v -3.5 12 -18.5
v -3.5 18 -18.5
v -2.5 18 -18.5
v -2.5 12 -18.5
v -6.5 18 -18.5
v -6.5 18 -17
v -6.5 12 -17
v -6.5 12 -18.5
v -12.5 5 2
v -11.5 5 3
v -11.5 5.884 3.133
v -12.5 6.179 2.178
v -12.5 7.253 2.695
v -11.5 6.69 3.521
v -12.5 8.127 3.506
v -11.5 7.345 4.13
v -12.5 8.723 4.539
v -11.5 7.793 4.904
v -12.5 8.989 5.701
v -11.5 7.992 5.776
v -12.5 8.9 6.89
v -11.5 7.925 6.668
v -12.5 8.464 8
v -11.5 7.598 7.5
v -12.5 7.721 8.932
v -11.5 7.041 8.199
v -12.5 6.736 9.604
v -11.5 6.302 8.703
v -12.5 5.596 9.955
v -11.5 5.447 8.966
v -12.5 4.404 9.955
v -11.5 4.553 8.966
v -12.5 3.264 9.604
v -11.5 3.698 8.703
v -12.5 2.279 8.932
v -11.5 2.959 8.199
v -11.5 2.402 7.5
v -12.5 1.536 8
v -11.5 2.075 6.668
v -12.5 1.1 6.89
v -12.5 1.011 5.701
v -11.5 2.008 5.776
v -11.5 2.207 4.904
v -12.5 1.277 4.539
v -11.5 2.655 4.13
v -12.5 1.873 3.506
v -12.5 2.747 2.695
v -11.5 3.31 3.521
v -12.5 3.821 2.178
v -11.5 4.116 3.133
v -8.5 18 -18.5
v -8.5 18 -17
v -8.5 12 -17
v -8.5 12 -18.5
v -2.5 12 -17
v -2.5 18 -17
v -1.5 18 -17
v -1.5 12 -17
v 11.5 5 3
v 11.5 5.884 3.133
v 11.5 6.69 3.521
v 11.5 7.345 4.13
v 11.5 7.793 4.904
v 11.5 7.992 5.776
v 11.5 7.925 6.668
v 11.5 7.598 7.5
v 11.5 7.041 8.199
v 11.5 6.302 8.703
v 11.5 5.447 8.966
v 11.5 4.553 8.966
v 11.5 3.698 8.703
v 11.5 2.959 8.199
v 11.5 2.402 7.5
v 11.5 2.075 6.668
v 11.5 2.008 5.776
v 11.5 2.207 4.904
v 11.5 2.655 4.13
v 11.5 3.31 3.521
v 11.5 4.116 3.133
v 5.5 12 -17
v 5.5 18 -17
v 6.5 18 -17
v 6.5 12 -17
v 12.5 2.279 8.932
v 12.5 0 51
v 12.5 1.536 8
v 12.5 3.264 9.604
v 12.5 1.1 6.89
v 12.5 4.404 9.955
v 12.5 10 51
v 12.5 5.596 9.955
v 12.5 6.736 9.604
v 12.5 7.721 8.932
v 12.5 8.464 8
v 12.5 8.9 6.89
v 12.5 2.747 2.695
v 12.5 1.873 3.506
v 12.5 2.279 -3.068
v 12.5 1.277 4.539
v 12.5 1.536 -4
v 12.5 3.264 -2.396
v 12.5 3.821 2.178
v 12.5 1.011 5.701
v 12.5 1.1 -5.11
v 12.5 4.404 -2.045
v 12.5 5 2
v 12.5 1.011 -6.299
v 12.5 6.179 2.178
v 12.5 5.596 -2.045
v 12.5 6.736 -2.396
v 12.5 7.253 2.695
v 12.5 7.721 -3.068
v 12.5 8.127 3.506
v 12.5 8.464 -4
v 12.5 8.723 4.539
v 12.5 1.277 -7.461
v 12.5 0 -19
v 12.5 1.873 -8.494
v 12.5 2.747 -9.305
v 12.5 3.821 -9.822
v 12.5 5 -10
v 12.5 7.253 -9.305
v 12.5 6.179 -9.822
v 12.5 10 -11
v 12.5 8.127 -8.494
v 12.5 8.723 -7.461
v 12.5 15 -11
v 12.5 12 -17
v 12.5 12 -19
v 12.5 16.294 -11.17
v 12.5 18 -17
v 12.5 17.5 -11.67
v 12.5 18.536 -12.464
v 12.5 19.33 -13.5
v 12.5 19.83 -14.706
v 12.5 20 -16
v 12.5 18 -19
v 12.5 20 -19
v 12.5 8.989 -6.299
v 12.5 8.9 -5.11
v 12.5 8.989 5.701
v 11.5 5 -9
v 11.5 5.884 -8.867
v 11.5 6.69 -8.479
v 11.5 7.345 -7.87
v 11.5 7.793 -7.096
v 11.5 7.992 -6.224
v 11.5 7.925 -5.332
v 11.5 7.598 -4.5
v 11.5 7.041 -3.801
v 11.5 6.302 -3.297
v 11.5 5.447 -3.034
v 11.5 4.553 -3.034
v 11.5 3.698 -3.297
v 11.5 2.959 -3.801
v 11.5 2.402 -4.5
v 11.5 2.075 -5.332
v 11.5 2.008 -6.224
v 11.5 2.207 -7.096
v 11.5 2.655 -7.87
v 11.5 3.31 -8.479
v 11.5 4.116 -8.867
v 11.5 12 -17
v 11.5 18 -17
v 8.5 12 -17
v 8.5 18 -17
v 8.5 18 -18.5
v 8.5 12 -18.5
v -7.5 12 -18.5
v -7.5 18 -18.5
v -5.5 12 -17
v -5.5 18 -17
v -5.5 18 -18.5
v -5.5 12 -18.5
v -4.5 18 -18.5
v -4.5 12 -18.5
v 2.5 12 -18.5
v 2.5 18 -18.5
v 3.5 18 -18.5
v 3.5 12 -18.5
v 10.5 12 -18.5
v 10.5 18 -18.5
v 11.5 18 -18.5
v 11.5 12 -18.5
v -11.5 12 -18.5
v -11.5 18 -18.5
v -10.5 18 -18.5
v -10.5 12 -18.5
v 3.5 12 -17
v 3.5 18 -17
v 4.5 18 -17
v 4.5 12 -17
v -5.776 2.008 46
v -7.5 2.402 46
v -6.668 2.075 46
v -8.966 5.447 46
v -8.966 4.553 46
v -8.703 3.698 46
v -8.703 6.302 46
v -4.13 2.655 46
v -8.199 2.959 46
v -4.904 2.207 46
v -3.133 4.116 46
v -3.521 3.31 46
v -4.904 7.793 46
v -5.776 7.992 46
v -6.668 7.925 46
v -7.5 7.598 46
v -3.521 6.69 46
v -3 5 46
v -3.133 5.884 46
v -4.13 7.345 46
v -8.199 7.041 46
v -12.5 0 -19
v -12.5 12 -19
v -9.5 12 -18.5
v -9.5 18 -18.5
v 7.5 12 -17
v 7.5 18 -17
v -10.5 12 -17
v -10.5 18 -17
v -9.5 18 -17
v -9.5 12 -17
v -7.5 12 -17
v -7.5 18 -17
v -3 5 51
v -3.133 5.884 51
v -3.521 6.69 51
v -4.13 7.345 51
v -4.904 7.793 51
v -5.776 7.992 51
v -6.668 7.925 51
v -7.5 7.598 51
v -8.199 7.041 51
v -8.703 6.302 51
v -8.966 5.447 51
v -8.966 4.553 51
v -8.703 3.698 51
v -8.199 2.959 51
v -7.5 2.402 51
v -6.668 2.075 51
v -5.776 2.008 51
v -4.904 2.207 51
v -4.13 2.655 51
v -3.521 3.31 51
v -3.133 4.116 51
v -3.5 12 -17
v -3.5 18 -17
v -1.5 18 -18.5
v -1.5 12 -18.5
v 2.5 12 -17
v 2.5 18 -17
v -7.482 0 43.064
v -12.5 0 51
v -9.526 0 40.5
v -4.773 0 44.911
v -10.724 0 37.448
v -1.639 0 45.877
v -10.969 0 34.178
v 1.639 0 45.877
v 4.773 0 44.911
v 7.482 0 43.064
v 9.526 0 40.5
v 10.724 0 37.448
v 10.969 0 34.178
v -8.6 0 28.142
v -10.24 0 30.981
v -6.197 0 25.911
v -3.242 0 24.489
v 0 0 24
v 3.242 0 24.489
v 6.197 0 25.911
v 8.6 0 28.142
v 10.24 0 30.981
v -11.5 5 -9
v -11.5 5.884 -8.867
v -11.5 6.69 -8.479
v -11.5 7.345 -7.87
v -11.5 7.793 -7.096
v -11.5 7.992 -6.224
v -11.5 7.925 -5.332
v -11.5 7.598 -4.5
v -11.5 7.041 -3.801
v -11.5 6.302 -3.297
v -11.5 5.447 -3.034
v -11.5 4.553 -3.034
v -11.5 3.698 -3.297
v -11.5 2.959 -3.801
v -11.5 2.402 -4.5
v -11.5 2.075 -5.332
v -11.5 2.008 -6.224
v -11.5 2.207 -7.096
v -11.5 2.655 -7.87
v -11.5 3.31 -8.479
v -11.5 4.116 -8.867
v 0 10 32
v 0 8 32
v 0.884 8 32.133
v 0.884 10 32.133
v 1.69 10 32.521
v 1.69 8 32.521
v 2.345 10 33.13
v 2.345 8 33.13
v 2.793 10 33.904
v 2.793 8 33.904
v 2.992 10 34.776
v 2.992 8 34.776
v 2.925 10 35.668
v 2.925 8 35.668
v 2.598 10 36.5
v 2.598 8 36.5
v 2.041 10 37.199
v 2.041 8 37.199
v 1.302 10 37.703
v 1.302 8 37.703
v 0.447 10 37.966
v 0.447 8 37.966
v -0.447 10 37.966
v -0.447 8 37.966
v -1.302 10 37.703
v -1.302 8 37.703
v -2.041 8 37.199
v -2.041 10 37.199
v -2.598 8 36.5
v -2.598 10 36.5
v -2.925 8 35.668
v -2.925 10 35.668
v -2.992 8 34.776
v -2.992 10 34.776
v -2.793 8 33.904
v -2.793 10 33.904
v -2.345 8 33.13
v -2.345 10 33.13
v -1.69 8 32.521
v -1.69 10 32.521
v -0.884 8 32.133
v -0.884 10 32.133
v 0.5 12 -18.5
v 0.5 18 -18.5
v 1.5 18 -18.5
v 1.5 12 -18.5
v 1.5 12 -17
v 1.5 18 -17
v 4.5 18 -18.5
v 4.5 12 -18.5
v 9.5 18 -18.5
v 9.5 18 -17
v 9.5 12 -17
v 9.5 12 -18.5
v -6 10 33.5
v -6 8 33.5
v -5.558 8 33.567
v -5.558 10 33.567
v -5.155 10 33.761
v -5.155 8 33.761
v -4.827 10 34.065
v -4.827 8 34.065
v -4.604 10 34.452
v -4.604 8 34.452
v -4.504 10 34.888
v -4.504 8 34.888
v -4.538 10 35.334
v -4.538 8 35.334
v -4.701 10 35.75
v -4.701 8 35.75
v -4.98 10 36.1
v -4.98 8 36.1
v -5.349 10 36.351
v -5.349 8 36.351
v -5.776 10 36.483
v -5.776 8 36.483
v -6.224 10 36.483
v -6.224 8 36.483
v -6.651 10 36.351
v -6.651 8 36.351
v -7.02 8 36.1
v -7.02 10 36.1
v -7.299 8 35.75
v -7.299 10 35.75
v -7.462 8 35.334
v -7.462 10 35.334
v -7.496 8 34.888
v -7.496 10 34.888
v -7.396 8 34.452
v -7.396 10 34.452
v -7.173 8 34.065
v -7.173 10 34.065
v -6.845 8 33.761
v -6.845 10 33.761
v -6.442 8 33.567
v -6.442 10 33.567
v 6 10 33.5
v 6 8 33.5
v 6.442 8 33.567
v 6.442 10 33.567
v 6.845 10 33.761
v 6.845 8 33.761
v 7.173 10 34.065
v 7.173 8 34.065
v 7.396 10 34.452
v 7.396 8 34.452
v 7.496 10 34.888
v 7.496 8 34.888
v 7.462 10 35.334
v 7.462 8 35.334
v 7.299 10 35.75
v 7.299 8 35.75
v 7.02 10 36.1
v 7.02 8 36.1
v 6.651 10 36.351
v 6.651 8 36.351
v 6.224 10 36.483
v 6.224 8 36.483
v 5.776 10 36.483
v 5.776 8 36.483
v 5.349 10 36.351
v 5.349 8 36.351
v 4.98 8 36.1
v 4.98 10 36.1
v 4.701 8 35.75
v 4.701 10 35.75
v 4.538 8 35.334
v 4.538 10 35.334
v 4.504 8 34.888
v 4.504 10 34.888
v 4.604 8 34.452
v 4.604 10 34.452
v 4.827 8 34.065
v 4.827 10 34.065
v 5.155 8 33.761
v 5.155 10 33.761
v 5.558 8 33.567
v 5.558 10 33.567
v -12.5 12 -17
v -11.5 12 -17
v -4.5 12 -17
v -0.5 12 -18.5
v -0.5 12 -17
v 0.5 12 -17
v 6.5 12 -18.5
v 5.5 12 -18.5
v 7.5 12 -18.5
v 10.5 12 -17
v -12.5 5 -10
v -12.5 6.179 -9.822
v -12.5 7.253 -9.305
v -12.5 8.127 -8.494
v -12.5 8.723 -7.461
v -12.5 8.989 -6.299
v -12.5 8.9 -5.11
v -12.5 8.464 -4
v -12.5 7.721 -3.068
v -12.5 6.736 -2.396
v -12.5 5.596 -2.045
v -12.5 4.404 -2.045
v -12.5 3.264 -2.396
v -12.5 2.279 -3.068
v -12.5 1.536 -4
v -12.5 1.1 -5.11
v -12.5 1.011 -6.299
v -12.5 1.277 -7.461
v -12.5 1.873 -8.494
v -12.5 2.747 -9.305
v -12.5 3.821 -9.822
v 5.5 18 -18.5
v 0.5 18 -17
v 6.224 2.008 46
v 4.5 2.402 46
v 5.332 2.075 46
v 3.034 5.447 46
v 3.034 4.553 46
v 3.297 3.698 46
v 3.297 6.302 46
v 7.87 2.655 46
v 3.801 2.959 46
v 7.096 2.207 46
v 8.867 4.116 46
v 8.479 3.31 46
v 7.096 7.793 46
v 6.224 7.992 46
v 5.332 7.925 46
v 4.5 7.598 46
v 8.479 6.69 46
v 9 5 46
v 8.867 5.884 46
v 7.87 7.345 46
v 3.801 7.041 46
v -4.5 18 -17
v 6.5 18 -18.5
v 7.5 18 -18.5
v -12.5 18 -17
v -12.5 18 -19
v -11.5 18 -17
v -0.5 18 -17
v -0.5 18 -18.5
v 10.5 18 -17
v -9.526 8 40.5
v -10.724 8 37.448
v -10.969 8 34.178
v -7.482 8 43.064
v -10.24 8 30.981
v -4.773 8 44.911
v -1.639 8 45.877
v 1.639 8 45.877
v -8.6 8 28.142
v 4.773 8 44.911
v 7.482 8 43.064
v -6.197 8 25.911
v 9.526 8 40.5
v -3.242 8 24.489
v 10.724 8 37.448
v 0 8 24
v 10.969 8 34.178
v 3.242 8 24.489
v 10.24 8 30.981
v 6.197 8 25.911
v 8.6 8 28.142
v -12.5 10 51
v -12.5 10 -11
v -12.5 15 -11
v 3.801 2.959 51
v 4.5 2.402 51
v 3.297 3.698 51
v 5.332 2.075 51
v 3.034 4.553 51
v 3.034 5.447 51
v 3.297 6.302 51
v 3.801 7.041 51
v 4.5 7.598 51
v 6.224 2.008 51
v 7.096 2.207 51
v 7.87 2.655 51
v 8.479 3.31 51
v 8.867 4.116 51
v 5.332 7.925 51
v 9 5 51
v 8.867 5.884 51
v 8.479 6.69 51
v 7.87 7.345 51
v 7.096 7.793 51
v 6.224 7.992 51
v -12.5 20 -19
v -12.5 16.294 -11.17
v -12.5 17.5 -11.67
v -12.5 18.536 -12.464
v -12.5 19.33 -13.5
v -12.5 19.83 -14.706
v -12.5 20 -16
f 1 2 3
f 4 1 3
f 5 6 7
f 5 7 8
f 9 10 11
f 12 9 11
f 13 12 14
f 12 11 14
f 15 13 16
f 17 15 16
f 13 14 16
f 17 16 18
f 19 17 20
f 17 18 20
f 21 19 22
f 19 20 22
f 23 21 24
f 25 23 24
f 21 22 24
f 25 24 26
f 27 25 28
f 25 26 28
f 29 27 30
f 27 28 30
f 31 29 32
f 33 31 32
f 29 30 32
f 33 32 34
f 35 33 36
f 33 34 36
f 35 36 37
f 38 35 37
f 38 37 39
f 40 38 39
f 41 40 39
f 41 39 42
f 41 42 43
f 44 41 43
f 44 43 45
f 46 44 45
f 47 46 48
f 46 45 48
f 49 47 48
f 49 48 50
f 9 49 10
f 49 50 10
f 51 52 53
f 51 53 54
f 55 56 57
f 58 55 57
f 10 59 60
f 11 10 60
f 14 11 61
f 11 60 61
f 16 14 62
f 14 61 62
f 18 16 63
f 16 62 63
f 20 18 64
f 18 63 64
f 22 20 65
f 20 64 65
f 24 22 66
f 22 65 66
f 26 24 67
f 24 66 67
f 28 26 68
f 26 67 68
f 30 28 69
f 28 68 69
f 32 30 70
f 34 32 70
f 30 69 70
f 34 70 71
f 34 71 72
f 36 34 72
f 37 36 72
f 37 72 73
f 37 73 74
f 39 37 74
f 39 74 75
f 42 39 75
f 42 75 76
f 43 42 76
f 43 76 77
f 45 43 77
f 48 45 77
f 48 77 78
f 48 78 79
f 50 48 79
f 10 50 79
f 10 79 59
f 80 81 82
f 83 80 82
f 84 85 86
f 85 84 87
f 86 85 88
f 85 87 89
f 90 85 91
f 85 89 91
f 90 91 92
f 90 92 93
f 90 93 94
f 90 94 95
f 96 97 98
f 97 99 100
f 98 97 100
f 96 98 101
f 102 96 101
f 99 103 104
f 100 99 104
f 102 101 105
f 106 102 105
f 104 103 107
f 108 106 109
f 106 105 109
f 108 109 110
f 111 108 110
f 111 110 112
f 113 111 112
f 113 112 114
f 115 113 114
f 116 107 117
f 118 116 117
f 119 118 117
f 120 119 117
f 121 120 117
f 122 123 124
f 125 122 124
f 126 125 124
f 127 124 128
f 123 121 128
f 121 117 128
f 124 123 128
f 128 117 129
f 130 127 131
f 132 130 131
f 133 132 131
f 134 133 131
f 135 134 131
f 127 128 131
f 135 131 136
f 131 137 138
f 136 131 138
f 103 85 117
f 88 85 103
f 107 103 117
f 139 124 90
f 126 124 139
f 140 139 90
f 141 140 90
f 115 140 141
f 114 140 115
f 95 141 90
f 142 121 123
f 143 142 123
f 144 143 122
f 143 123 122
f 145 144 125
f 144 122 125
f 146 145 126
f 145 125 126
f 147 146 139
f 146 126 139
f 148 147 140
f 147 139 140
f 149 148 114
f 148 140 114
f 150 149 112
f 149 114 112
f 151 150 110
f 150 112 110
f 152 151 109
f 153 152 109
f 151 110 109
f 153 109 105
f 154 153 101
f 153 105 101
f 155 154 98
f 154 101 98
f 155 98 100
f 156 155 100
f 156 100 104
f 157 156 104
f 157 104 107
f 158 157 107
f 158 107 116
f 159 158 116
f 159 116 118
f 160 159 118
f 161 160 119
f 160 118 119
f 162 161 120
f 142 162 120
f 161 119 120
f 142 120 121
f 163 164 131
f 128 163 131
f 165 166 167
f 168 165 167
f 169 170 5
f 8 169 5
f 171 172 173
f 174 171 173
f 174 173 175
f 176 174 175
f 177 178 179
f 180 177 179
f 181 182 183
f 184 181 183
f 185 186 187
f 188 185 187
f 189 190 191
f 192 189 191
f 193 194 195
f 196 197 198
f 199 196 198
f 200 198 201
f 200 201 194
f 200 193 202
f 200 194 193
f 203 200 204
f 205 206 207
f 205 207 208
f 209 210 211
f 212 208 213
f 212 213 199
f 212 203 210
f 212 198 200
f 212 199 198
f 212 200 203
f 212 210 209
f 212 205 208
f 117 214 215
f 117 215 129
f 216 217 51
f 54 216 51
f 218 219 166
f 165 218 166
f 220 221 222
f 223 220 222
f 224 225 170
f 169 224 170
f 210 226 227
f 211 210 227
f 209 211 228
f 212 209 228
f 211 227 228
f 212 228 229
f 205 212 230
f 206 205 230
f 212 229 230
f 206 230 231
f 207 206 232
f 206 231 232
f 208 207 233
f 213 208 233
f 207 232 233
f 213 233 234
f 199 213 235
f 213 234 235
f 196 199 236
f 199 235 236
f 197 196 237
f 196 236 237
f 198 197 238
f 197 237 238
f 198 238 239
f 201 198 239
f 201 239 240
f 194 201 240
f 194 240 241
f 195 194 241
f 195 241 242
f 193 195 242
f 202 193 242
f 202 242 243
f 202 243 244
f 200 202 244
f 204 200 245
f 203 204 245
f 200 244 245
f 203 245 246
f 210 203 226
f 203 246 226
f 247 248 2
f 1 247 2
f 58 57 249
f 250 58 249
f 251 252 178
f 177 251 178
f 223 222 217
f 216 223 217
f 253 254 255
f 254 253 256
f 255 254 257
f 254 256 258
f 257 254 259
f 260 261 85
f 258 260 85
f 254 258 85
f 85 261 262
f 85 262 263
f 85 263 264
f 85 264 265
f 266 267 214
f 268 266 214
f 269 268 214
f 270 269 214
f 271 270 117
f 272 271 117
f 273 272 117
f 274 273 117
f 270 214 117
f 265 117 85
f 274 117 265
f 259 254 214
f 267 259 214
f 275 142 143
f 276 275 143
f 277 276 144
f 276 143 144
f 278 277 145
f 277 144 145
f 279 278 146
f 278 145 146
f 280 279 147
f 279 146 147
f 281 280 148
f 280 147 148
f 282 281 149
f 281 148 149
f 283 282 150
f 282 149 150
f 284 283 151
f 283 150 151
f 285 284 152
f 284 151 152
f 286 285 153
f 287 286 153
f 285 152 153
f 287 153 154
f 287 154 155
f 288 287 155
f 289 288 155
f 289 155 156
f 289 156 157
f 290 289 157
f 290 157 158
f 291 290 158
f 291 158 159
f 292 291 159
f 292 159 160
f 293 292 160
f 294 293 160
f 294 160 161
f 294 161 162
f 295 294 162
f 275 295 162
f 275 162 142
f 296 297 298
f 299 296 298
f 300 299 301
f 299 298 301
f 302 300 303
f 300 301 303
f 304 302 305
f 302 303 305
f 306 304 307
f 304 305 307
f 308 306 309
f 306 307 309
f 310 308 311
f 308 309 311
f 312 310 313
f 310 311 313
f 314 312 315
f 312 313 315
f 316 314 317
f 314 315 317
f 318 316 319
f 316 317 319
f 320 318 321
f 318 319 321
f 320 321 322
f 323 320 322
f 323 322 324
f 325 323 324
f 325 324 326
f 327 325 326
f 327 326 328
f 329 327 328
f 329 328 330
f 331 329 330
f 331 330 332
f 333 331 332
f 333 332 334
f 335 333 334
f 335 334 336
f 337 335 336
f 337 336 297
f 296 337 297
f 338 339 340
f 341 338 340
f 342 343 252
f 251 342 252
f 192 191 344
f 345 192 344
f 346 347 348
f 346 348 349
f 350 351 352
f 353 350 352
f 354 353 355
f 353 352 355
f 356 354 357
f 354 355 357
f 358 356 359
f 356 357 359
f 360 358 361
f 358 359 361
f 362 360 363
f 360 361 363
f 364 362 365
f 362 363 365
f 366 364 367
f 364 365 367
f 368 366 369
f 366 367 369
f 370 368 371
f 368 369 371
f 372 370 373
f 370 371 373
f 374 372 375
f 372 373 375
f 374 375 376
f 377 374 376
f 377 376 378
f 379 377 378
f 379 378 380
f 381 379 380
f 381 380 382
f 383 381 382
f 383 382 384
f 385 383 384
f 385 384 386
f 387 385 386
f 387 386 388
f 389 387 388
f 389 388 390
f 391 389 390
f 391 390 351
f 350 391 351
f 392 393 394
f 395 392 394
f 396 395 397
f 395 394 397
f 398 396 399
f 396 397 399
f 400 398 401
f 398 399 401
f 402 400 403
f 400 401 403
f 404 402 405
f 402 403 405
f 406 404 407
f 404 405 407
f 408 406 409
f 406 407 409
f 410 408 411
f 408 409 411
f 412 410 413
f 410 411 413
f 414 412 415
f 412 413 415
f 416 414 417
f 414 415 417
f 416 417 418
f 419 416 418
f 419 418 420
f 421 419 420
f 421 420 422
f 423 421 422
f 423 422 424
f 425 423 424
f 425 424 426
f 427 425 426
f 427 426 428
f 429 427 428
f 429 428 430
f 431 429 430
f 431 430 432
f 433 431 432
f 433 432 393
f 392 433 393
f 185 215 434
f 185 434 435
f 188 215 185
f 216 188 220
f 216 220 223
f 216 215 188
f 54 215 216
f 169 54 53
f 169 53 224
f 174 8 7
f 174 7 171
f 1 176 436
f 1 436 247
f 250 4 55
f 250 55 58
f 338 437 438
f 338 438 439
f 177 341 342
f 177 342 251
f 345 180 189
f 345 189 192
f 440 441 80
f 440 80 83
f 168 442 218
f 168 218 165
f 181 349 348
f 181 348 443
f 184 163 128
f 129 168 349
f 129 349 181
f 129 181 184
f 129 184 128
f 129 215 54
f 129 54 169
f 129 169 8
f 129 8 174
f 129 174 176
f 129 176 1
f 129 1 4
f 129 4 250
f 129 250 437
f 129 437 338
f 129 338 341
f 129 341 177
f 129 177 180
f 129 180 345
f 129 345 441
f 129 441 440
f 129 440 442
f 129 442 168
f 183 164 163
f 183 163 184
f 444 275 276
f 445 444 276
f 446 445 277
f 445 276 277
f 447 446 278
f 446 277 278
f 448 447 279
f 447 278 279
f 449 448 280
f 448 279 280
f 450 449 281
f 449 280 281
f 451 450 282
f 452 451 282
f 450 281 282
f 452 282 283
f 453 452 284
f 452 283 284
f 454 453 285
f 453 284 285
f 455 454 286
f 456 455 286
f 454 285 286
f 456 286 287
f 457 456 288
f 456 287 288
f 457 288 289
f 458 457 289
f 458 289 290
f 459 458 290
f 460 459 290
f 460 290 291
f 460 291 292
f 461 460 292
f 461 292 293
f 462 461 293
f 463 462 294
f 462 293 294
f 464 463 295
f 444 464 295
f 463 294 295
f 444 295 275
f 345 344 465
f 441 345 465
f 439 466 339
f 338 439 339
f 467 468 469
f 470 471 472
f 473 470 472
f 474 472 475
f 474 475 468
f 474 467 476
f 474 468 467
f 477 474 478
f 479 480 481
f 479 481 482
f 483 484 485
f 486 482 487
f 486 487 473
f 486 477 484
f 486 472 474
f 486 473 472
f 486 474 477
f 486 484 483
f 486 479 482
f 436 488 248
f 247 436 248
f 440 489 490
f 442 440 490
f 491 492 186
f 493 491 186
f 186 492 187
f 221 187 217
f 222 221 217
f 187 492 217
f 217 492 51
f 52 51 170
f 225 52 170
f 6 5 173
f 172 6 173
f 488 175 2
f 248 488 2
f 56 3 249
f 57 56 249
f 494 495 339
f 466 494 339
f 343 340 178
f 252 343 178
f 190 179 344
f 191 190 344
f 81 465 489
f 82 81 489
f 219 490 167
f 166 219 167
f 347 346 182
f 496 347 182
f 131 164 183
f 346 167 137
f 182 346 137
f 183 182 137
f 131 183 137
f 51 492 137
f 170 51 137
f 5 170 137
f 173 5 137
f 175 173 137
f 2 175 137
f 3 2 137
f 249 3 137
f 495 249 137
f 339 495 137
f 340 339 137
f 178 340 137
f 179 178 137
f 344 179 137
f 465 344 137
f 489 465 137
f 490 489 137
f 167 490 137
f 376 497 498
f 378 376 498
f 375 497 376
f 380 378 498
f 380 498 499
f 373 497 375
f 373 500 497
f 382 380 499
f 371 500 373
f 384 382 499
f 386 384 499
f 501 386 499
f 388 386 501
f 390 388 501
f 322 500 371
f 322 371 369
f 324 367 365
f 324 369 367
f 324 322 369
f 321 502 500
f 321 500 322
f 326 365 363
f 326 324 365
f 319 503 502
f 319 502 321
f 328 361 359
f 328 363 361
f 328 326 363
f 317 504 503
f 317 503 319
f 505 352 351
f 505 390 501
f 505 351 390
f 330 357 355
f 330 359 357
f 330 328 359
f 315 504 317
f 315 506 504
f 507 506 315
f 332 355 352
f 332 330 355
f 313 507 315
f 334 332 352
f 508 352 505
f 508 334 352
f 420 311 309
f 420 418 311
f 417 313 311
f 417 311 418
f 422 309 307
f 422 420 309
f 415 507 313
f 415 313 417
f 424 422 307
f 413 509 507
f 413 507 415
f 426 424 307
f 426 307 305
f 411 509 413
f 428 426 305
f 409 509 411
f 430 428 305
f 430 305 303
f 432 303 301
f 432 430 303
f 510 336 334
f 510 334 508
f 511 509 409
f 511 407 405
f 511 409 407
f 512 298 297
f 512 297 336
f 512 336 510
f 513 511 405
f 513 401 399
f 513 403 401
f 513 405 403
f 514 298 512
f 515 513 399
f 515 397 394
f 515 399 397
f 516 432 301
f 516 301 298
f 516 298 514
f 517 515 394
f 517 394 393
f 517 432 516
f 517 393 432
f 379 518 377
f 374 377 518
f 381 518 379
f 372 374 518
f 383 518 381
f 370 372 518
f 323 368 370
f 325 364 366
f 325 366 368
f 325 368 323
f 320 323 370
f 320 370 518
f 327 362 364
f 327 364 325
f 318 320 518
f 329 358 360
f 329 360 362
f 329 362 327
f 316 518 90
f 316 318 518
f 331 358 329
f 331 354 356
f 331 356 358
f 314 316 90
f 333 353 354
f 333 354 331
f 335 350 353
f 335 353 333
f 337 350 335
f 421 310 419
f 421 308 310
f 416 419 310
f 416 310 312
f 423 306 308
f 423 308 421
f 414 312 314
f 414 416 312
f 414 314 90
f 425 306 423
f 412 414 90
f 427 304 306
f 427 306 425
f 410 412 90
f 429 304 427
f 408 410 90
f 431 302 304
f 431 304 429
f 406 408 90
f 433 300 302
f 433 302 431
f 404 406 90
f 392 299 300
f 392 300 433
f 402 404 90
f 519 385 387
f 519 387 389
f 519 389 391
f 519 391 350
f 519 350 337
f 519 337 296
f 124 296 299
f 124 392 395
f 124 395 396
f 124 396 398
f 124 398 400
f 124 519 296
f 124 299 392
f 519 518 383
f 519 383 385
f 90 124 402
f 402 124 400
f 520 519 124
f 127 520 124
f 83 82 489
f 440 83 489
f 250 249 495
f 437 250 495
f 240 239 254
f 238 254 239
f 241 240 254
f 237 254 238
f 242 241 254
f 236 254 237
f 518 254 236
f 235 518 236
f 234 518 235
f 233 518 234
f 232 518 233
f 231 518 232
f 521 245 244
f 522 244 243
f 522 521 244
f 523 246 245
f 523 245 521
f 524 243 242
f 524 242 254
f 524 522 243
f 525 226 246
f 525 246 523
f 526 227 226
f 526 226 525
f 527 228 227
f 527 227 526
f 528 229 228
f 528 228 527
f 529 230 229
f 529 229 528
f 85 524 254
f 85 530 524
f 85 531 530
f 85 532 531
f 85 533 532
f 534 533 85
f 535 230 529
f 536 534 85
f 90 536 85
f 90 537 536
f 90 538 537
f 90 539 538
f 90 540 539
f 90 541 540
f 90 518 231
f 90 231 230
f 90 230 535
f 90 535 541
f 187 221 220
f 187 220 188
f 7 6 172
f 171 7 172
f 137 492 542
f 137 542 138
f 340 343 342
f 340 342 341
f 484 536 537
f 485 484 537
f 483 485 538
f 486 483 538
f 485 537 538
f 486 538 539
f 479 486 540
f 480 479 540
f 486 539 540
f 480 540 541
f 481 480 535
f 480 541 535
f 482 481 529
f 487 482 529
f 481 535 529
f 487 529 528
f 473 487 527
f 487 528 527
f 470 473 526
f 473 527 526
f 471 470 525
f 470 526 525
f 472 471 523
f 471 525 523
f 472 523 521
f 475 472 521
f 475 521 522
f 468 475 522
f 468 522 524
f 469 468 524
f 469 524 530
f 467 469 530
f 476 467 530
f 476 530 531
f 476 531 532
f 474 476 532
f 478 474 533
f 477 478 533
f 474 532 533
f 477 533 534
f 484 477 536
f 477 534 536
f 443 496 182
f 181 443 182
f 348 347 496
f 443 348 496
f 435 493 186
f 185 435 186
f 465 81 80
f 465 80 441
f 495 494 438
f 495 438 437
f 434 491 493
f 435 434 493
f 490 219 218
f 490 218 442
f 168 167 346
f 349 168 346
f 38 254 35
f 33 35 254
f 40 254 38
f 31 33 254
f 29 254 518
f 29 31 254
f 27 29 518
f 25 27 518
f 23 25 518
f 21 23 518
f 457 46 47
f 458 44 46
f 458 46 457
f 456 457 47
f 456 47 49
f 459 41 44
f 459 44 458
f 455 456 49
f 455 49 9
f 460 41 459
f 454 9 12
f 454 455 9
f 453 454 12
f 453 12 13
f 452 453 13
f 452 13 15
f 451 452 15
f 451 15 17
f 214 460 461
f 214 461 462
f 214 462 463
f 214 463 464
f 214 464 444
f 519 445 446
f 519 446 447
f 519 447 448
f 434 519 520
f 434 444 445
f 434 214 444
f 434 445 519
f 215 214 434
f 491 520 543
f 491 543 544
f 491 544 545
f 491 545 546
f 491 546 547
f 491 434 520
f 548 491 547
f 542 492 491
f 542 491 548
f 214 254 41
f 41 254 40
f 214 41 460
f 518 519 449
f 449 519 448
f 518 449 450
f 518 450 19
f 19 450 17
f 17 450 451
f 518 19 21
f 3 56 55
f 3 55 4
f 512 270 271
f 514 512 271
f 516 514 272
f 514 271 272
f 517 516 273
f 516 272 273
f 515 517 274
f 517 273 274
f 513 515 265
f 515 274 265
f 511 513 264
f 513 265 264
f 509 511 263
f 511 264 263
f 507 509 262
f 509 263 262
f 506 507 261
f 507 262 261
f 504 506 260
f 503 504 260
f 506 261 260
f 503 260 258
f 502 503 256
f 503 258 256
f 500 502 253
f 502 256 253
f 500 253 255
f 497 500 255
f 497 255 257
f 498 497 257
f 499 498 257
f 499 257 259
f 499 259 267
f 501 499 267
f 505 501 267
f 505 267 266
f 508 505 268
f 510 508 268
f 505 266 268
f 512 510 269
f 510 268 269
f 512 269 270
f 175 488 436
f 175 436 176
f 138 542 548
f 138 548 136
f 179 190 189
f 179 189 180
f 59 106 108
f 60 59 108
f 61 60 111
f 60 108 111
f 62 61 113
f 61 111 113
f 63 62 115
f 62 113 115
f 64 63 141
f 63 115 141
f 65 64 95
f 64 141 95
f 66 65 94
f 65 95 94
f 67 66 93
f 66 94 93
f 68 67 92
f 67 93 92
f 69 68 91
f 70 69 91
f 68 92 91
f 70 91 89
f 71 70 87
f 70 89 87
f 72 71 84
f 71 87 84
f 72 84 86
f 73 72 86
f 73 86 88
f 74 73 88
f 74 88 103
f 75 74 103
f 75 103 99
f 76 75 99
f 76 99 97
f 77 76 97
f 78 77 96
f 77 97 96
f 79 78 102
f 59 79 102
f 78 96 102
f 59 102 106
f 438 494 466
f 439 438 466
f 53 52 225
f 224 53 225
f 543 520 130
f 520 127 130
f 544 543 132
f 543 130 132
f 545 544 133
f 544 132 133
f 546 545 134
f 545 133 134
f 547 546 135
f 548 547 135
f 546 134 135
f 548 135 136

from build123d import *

# Parameters (mm, degrees)
SKETCH1_W                = 25
SKETCH1_H                = 22
BOSS_EXTRUDE1_DEPTH      = 10
SKETCH2_R                = 3
CUT_EXTRUDE1_DEPTH       = 30.086079144
CHAMFER1_SIZE            = 1
BOSS_EXTRUDE4_DEPTH      = 10
BOSS_EXTRUDE4_DEPTH_BACK = 10
SKETCH3_W                = 25
SKETCH3_H                = 8
CUT_EXTRUDE6_DEPTH       = 6
SKETCH5_W                = 25
SKETCH5_H                = 10
BOSS_EXTRUDE3_DEPTH      = 40
SKETCH6_R                = 11
CUT_EXTRUDE3_DEPTH       = 8
SKETCH7_R                = 3
SKETCH7_R_2              = 1.5
CUT_EXTRUDE4_DEPTH       = 8
SKETCH8_R                = 3
CUT_EXTRUDE5_DEPTH       = 5
FILLET1_R                = 5


with BuildPart() as part:
    # Sketch1 → Boss-Extrude1 (new body)
    with BuildSketch(Plane(origin=(0, 0, 0), x_dir=(1, 0, 0), z_dir=(0, 1, 0))):
        Rectangle(SKETCH1_W, SKETCH1_H)
    extrude(amount=BOSS_EXTRUDE1_DEPTH)

    # Sketch2 → Cut-Extrude1 (cut, through all)
    with BuildSketch(Plane(origin=(12.5, 0, 0), x_dir=(0, 0, -1), z_dir=(1, 0, 0))):
        with Locations((-6, 5)):
            Circle(SKETCH2_R)
        with Locations((6, 5)):
            Circle(SKETCH2_R)
    extrude(amount=-CUT_EXTRUDE1_DEPTH, mode=Mode.SUBTRACT)

    # Chamfer1
    chamfer1_edges = [part.edges().sort_by_distance(p)[0] for p in [
        (-12.5, 5, -3),
        (-12.5, 5, 9),
        (12.5, 5, -3),
        (12.5, 5, 9),
    ]]
    chamfer(chamfer1_edges, length=CHAMFER1_SIZE)

    # Sketch3 → Boss-Extrude4 (add, two sides: drawn at the far end of the back side and taken through both)
    with BuildSketch(Plane(origin=(0, 10, 0), x_dir=(1, 0, 0), z_dir=(0, 1, 0)).offset(-BOSS_EXTRUDE4_DEPTH_BACK)):
        with Locations((0, 15)):
            Rectangle(SKETCH3_W, SKETCH3_H)
    extrude(amount=BOSS_EXTRUDE4_DEPTH + BOSS_EXTRUDE4_DEPTH_BACK)

    # Sketch10 → Cut-Extrude6 (cut)
    with BuildSketch(Plane(origin=(0, 18, 0), x_dir=(1, 0, 0), z_dir=(0, 1, 0))):
        Polygon((12.5, 19), (-12.5, 19), (-12.5, 17), (-11.5, 17), (-11.5, 18.5), (-10.5, 18.5), (-10.5, 17), (-9.5, 17), (-9.5, 18.5), (-8.5, 18.5), (-8.5, 17), (-7.5, 17), (-7.5, 18.5), (-6.5, 18.5), (-6.5, 17), (-5.5, 17), (-5.5, 18.5), (-4.5, 18.5), (-4.5, 17), (-3.5, 17), (-3.5, 18.5), (-2.5, 18.5), (-2.5, 17), (-1.5, 17), (-1.5, 18.5), (-0.5, 18.5), (-0.5, 17), (0.5, 17), (0.5, 18.5), (1.5, 18.5), (1.5, 17), (2.5, 17), (2.5, 18.5), (3.5, 18.5), (3.5, 17), (4.5, 17), (4.5, 18.5), (5.5, 18.5), (5.5, 17), (6.5, 17), (6.5, 18.5), (7.5, 18.5), (7.5, 17), (8.5, 17), (8.5, 18.5), (9.5, 18.5), (9.5, 17), (10.5, 17), (10.5, 18.5), (11.5, 18.5), (11.5, 17), (12.5, 17), align=None)
    extrude(amount=-CUT_EXTRUDE6_DEPTH, mode=Mode.SUBTRACT)

    # Sketch5 → Boss-Extrude3 (add)
    with BuildSketch(Plane.XY.offset(11)):
        with Locations((0, 5)):
            Rectangle(SKETCH5_W, SKETCH5_H)
    extrude(amount=BOSS_EXTRUDE3_DEPTH)

    # Sketch6 → Cut-Extrude3 (cut)
    with BuildSketch(Plane.XZ):
        with Locations((0, 35)):
            Circle(SKETCH6_R)
    extrude(amount=-CUT_EXTRUDE3_DEPTH, mode=Mode.SUBTRACT)

    # Sketch7 → Cut-Extrude4 (cut)
    with BuildSketch(Plane.XZ.offset(-8)):
        with Locations((0, 35)):
            Circle(SKETCH7_R)
        with Locations((-6, 35)):
            Circle(SKETCH7_R_2)
        with Locations((6, 35)):
            Circle(SKETCH7_R_2)
    extrude(amount=-CUT_EXTRUDE4_DEPTH, mode=Mode.SUBTRACT)

    # Sketch8 → Cut-Extrude5 (cut)
    with BuildSketch(Plane.XY.offset(51)):
        with Locations((6, 5)):
            Circle(SKETCH8_R)
        with Locations((-6, 5)):
            Circle(SKETCH8_R)
    extrude(amount=-CUT_EXTRUDE5_DEPTH, mode=Mode.SUBTRACT)

    # Fillet1
    fillet1_edges = [part.edges().sort_by_distance(p)[0] for p in [
        (0, 20, -11),
    ]]
    fillet(fillet1_edges, radius=FILLET1_R)


solid = part.part
